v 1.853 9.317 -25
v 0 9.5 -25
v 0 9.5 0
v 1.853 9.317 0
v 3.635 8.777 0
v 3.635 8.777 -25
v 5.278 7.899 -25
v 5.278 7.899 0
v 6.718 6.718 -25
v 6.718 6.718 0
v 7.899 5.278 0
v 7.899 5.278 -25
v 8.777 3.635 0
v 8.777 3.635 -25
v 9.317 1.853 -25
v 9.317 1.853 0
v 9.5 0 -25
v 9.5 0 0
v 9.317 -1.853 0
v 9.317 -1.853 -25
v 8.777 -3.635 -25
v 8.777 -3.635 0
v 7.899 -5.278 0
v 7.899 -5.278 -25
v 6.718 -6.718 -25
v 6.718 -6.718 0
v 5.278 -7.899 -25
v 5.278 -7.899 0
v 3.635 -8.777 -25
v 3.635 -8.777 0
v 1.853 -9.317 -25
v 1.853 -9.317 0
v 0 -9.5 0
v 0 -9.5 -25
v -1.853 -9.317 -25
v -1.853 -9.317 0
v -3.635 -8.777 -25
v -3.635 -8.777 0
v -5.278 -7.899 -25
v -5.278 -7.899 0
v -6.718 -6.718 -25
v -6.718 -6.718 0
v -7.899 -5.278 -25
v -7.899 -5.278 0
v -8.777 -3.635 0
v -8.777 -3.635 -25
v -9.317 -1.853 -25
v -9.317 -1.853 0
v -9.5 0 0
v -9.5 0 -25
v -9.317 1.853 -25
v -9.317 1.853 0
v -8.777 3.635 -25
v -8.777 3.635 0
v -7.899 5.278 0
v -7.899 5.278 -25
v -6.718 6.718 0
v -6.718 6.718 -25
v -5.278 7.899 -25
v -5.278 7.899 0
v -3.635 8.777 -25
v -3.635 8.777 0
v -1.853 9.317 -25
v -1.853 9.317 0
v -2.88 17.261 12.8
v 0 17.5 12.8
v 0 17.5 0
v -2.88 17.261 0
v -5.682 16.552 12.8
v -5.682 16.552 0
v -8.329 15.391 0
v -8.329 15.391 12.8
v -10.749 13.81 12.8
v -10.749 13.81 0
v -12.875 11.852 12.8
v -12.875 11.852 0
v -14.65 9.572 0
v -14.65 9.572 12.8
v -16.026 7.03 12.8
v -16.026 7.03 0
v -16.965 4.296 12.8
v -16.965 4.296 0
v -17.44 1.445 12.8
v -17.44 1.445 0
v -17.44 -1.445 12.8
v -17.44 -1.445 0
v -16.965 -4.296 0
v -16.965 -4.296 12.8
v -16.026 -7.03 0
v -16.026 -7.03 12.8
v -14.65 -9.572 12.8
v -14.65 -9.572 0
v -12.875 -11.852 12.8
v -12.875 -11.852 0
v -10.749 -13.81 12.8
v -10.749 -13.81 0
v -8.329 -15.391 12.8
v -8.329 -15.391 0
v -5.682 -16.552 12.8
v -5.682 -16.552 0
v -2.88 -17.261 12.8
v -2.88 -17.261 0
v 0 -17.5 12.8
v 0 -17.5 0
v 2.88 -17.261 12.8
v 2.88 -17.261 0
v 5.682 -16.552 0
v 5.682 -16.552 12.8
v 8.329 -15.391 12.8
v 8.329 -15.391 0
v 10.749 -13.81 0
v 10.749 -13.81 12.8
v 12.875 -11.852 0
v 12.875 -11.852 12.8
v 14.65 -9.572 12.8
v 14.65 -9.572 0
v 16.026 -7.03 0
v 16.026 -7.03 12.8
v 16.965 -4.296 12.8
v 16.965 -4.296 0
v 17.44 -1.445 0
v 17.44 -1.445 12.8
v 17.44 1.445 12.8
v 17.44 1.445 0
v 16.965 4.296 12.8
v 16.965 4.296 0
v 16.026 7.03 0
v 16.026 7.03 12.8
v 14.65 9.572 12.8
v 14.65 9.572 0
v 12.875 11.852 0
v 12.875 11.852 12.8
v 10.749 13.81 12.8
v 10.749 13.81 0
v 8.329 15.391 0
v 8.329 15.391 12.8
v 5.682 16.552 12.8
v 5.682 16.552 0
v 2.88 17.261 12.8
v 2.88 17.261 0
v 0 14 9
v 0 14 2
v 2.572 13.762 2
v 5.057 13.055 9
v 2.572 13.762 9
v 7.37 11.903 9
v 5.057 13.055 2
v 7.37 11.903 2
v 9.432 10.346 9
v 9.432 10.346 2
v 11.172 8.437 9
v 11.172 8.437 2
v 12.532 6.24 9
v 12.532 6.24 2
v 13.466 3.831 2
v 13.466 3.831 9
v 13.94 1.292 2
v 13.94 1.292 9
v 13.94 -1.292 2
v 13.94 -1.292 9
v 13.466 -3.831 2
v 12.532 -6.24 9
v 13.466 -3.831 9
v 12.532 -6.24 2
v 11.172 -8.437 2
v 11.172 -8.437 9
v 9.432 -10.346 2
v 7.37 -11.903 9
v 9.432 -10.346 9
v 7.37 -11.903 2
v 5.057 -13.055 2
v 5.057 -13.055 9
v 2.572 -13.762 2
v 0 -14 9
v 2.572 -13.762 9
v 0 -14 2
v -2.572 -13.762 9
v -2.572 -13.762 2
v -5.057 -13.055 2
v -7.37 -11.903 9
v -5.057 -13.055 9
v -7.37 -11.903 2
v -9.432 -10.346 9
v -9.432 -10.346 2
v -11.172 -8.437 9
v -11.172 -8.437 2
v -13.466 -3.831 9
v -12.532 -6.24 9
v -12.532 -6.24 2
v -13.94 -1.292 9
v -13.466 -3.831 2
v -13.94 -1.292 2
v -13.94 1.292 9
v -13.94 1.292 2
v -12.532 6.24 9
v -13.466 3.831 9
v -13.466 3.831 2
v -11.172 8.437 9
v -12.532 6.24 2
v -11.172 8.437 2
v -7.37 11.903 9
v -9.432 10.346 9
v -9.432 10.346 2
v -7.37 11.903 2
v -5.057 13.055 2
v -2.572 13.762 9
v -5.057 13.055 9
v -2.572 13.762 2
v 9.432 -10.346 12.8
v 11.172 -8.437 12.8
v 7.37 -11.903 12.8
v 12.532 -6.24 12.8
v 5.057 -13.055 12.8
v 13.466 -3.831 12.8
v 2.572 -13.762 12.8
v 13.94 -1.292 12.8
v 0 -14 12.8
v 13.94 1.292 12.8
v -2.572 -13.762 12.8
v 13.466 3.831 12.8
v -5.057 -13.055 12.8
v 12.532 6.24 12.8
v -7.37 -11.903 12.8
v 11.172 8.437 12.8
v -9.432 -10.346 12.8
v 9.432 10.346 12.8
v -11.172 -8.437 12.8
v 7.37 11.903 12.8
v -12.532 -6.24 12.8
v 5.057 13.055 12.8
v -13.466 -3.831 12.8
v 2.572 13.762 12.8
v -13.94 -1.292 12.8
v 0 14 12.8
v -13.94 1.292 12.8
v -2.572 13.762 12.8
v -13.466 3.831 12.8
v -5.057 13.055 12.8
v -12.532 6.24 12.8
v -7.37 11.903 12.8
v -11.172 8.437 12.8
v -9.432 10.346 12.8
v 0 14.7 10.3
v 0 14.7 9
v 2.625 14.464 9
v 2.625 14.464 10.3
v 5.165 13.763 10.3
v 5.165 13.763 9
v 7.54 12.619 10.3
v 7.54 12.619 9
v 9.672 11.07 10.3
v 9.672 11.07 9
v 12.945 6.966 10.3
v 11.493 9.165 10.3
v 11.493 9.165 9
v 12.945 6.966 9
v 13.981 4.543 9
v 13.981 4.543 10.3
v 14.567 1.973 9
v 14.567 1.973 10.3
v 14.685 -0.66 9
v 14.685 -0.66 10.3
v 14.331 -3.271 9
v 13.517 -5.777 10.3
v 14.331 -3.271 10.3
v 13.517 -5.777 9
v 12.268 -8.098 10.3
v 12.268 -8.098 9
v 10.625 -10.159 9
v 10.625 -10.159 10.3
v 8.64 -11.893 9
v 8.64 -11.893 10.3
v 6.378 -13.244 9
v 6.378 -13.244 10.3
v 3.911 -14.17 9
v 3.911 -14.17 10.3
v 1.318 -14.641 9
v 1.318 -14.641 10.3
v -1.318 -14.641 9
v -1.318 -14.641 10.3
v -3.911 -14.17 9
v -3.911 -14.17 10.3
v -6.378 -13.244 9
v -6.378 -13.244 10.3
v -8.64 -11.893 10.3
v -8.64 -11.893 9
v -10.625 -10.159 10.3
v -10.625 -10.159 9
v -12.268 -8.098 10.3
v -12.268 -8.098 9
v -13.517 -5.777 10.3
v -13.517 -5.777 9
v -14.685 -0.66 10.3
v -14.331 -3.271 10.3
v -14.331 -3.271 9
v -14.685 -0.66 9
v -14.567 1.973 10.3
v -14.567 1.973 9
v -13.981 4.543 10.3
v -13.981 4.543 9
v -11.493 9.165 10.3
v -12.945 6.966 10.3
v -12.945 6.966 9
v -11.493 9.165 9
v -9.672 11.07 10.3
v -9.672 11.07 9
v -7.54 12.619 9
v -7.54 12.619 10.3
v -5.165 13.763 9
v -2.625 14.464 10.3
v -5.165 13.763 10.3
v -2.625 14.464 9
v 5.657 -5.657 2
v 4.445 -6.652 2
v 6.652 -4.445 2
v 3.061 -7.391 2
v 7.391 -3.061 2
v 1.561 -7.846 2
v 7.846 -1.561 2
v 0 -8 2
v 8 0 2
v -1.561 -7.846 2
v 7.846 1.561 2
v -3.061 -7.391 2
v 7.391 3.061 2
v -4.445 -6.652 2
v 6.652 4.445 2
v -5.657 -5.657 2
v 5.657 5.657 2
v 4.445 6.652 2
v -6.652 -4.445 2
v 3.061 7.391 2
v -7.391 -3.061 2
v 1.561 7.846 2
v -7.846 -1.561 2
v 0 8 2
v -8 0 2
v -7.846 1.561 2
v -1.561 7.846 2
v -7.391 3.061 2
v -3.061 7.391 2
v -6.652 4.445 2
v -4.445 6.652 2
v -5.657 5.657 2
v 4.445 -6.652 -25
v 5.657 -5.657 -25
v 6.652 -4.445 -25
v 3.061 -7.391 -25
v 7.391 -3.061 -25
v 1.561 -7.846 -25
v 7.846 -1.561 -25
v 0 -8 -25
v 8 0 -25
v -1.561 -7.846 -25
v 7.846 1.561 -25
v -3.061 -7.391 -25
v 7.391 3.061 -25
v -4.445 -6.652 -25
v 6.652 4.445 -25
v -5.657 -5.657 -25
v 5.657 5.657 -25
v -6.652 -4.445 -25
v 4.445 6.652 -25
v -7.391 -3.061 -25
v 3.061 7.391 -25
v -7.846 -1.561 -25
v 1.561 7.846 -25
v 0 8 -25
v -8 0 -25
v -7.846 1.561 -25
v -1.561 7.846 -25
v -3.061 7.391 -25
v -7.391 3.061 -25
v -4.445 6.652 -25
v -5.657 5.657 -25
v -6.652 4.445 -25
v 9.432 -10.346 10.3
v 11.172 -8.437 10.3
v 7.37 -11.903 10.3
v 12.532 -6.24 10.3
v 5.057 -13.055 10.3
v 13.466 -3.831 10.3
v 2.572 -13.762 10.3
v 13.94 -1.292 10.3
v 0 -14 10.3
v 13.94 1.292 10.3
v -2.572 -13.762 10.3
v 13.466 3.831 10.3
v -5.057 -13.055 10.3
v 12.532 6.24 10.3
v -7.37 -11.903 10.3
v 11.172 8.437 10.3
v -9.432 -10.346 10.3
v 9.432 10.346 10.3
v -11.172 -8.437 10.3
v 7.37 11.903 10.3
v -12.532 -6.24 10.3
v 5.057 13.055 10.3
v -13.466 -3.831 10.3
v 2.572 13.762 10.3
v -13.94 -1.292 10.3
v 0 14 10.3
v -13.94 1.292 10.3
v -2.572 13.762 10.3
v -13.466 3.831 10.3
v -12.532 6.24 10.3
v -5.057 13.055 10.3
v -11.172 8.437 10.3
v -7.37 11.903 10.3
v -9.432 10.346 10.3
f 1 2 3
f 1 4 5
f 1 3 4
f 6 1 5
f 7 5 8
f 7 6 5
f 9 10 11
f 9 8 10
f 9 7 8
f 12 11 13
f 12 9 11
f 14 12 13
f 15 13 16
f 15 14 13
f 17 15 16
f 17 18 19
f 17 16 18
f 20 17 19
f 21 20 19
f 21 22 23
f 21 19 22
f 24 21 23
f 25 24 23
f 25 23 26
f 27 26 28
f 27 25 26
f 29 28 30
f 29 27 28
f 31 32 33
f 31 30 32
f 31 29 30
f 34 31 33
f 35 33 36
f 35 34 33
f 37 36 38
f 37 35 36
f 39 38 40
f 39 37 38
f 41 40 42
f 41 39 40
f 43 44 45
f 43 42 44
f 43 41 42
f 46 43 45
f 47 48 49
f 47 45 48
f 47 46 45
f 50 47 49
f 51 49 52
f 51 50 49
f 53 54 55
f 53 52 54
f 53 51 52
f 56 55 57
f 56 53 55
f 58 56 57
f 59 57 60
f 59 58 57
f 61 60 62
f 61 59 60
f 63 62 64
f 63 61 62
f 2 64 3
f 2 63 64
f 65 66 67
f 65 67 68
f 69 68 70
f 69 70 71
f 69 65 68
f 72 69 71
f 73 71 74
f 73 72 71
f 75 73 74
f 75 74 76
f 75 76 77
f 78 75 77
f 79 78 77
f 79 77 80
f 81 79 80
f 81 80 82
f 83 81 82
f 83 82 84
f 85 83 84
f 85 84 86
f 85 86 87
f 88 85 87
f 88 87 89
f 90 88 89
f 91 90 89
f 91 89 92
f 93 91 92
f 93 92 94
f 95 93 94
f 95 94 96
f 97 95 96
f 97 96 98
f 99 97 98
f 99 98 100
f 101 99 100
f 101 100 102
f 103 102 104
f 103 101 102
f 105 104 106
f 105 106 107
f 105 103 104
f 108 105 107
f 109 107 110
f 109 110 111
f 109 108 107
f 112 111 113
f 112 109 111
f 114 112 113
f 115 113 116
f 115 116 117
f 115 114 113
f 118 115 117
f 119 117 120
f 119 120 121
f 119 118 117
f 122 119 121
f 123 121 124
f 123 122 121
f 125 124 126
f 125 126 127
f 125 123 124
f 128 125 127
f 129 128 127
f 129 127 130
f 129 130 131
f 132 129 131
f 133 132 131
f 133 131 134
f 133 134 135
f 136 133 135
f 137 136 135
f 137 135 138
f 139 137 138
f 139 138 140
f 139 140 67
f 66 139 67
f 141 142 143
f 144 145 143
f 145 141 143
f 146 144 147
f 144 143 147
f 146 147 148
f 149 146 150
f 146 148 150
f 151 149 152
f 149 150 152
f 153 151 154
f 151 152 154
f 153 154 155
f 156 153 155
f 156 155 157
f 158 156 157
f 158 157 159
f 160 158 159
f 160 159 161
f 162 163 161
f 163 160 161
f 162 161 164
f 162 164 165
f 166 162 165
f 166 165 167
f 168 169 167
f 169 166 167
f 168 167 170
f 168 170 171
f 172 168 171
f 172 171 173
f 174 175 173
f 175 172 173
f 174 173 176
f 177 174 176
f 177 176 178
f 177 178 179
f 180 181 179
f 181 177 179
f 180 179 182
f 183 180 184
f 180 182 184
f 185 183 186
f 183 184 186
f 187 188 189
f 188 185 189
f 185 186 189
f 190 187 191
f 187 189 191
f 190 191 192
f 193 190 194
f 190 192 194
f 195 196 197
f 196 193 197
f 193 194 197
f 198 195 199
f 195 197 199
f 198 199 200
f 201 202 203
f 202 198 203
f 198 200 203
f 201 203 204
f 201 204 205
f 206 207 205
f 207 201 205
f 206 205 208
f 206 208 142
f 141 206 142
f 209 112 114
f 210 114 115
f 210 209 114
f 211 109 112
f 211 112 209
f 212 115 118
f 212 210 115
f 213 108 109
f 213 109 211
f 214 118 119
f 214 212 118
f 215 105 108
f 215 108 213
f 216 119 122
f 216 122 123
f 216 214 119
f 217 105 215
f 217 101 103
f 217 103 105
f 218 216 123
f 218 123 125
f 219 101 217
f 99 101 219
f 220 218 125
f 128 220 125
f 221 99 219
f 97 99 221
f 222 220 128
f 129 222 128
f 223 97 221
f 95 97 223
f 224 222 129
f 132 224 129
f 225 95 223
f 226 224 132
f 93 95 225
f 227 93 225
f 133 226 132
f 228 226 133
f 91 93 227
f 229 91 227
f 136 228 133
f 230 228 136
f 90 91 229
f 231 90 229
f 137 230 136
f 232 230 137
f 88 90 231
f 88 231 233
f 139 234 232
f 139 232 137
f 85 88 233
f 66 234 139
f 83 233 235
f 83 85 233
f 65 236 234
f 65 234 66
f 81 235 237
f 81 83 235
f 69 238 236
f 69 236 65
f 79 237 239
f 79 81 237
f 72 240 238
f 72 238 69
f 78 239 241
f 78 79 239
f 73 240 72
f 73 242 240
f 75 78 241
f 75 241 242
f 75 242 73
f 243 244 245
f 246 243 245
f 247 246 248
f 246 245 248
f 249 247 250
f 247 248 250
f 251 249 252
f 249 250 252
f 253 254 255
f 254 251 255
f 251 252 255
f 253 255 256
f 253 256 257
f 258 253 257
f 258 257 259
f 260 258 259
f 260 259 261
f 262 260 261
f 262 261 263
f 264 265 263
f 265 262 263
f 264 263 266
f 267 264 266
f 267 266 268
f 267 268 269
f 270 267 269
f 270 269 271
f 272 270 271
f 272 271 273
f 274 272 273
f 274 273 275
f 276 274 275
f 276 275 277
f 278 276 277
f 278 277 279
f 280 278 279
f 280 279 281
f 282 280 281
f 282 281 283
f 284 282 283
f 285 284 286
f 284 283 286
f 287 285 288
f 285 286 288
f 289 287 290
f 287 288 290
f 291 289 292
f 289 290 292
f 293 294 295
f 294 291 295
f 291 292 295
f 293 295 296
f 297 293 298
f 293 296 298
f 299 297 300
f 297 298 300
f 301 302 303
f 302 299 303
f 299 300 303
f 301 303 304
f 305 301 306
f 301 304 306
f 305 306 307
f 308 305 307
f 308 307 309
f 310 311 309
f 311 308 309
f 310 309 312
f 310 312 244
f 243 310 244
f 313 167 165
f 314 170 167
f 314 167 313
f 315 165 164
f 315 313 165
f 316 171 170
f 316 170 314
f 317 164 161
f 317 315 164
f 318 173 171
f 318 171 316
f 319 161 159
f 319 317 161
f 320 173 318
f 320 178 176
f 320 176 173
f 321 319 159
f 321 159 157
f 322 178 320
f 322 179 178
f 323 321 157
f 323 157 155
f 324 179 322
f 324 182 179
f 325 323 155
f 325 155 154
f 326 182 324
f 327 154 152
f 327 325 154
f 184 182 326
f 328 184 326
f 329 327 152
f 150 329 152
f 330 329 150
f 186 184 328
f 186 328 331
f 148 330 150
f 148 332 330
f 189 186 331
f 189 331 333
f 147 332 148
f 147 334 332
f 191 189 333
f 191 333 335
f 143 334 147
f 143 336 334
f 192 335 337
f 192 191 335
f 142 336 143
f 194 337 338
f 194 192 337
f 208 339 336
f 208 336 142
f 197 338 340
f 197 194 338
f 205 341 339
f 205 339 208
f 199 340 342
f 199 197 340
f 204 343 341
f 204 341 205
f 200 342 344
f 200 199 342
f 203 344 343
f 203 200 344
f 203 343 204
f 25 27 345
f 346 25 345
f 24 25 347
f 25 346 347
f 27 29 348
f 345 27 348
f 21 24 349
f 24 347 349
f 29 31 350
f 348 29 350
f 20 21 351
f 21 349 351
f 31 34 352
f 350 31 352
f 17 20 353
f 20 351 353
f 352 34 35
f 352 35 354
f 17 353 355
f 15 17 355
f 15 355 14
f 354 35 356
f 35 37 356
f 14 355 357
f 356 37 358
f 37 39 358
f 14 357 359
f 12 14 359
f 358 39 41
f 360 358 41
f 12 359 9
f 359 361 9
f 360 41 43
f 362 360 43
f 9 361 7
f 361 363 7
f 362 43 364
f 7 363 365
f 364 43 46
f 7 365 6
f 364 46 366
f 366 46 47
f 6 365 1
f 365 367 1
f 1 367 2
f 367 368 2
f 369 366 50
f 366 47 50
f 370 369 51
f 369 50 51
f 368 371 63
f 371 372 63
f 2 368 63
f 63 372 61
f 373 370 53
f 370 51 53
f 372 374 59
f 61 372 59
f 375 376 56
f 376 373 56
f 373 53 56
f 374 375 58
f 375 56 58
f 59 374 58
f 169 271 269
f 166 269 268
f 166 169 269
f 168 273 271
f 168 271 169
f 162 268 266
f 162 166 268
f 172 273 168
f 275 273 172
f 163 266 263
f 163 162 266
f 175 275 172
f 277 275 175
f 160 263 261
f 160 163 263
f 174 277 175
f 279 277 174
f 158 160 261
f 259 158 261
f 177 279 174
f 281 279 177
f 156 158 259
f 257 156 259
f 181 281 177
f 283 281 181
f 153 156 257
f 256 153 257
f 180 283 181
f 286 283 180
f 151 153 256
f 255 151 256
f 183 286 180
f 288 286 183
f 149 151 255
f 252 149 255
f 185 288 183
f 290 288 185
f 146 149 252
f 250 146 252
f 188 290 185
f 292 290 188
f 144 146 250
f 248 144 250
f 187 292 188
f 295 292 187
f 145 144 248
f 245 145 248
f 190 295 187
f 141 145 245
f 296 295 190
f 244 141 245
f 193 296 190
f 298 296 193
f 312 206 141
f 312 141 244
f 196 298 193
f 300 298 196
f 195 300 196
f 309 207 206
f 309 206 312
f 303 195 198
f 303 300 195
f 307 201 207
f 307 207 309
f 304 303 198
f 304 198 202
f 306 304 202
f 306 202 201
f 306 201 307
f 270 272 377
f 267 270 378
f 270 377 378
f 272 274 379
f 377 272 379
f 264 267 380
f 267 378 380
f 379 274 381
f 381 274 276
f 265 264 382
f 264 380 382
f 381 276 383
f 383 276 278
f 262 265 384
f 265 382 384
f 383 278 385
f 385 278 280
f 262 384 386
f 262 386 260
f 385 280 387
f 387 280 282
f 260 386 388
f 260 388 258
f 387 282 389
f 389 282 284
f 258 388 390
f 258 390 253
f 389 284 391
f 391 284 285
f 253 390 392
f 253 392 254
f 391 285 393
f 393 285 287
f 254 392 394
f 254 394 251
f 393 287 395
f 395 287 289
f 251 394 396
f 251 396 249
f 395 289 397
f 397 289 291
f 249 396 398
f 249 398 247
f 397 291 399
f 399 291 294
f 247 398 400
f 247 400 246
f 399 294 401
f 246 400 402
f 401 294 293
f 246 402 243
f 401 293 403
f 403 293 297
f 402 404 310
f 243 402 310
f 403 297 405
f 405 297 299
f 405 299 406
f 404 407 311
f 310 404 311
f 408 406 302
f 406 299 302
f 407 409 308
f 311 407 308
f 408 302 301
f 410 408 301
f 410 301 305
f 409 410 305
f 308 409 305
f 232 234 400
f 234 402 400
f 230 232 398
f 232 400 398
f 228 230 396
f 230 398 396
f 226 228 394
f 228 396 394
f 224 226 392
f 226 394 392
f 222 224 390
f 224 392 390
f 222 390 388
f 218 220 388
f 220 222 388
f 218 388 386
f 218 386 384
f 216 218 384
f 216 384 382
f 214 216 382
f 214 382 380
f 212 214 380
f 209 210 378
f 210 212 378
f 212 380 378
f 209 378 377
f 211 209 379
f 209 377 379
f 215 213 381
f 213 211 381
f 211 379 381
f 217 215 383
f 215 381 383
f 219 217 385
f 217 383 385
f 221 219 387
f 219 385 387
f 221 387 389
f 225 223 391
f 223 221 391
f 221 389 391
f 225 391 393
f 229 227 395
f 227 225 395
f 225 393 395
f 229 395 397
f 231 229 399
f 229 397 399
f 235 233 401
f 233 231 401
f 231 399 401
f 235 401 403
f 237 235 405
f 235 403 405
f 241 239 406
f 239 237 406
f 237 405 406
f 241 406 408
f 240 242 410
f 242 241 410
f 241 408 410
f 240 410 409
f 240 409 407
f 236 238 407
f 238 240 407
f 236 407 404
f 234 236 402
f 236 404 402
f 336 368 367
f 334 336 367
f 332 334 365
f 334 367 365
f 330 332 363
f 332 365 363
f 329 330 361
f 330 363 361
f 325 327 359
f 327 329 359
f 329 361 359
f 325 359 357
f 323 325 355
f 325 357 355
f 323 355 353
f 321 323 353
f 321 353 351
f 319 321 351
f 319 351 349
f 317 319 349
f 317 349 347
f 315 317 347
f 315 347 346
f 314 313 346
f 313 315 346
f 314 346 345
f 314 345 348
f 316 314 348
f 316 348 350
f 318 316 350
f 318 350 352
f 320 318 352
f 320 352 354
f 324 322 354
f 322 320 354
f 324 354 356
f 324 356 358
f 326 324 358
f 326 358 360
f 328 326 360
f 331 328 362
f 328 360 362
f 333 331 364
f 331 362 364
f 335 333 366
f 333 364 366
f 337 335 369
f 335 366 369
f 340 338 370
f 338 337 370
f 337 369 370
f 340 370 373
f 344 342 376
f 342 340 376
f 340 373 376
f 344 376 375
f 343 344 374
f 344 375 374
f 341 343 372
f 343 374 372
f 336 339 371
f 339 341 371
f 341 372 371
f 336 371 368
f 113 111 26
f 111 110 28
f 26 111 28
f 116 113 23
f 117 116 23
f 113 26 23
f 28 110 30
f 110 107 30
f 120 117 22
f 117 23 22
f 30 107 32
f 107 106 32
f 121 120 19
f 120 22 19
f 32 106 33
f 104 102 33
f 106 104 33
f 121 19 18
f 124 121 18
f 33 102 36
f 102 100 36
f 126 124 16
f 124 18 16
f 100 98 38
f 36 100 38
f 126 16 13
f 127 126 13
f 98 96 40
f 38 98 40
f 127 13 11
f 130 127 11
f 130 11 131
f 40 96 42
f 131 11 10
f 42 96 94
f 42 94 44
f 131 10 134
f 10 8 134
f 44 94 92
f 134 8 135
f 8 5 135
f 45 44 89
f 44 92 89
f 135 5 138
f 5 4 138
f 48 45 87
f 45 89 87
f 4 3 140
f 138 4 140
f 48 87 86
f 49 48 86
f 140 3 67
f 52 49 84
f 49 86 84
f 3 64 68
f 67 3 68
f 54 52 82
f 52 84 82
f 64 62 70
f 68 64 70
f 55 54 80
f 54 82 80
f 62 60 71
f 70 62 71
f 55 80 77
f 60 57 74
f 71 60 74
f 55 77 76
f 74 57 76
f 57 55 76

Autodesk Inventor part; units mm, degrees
ref_plane "YZ Plane" through (0, 0, 0) normal (1, 0, 0) x (0, 1, 0)
ref_plane "XZ Plane" through (0, 0, 0) normal (0, 1, 0) x (-1, 0, 0)
ref_plane "XY Plane" through (0, 0, 0) normal (0, 0, 1) x (1, 0, 0)
sketch "Sketch5" plane through (0, 0, 0) normal (1, 0, 0) x (0, 1, 0)
  line L0 (0, 0) -> (17.5, 0)
  line L1 (17.5, 0) -> (17.5, 12.8)
  line L2 (17.5, 12.8) -> (14, 12.8)
  line L3 (14, 12.8) -> (14, 10.3)
  line L4 (14, 10.3) -> (14.7, 10.3)
  line L5 (14.7, 10.3) -> (14.7, 9)
  line L6 (14.7, 9) -> (14, 9)
  line L7 (14, 9) -> (14, 2)
  line L8 (14, 2) -> (8, 2)
  line L9 (8, 2) -> (8, 0)
  line L10 (0, 0) -> (0, 12.8)
  line L11 (9.5, 0) -> (9.5, -25)
  line L12 (9.5, -25) -> (0, -25)
  line L13 (0, -25) -> (0, 0)
  line L14 (8, -25) -> (8, 0)
  dimension "d19" = 17.5
  dimension "d20" = 2.5
  dimension "d21" = 1.3
  dimension "d22" = 7
  dimension "d23" = 2
  dimension "d24" = 14.7
  dimension "d25" = 14
  dimension "d26" = 8
  dimension "d28" = 25
  dimension "d29" = 9.5
  dimension "d30" = 8
revolve "Revolution1" add sketch "Sketch5" angle 360 about axis through (0, 0, 0) along (0, 0, 1) contours L9 L8 L7 L6 L5 L4 L3 L2 L1 L0 | L0 L11 L12 L14
properties part number "P502" material "Aluminum 6061"
